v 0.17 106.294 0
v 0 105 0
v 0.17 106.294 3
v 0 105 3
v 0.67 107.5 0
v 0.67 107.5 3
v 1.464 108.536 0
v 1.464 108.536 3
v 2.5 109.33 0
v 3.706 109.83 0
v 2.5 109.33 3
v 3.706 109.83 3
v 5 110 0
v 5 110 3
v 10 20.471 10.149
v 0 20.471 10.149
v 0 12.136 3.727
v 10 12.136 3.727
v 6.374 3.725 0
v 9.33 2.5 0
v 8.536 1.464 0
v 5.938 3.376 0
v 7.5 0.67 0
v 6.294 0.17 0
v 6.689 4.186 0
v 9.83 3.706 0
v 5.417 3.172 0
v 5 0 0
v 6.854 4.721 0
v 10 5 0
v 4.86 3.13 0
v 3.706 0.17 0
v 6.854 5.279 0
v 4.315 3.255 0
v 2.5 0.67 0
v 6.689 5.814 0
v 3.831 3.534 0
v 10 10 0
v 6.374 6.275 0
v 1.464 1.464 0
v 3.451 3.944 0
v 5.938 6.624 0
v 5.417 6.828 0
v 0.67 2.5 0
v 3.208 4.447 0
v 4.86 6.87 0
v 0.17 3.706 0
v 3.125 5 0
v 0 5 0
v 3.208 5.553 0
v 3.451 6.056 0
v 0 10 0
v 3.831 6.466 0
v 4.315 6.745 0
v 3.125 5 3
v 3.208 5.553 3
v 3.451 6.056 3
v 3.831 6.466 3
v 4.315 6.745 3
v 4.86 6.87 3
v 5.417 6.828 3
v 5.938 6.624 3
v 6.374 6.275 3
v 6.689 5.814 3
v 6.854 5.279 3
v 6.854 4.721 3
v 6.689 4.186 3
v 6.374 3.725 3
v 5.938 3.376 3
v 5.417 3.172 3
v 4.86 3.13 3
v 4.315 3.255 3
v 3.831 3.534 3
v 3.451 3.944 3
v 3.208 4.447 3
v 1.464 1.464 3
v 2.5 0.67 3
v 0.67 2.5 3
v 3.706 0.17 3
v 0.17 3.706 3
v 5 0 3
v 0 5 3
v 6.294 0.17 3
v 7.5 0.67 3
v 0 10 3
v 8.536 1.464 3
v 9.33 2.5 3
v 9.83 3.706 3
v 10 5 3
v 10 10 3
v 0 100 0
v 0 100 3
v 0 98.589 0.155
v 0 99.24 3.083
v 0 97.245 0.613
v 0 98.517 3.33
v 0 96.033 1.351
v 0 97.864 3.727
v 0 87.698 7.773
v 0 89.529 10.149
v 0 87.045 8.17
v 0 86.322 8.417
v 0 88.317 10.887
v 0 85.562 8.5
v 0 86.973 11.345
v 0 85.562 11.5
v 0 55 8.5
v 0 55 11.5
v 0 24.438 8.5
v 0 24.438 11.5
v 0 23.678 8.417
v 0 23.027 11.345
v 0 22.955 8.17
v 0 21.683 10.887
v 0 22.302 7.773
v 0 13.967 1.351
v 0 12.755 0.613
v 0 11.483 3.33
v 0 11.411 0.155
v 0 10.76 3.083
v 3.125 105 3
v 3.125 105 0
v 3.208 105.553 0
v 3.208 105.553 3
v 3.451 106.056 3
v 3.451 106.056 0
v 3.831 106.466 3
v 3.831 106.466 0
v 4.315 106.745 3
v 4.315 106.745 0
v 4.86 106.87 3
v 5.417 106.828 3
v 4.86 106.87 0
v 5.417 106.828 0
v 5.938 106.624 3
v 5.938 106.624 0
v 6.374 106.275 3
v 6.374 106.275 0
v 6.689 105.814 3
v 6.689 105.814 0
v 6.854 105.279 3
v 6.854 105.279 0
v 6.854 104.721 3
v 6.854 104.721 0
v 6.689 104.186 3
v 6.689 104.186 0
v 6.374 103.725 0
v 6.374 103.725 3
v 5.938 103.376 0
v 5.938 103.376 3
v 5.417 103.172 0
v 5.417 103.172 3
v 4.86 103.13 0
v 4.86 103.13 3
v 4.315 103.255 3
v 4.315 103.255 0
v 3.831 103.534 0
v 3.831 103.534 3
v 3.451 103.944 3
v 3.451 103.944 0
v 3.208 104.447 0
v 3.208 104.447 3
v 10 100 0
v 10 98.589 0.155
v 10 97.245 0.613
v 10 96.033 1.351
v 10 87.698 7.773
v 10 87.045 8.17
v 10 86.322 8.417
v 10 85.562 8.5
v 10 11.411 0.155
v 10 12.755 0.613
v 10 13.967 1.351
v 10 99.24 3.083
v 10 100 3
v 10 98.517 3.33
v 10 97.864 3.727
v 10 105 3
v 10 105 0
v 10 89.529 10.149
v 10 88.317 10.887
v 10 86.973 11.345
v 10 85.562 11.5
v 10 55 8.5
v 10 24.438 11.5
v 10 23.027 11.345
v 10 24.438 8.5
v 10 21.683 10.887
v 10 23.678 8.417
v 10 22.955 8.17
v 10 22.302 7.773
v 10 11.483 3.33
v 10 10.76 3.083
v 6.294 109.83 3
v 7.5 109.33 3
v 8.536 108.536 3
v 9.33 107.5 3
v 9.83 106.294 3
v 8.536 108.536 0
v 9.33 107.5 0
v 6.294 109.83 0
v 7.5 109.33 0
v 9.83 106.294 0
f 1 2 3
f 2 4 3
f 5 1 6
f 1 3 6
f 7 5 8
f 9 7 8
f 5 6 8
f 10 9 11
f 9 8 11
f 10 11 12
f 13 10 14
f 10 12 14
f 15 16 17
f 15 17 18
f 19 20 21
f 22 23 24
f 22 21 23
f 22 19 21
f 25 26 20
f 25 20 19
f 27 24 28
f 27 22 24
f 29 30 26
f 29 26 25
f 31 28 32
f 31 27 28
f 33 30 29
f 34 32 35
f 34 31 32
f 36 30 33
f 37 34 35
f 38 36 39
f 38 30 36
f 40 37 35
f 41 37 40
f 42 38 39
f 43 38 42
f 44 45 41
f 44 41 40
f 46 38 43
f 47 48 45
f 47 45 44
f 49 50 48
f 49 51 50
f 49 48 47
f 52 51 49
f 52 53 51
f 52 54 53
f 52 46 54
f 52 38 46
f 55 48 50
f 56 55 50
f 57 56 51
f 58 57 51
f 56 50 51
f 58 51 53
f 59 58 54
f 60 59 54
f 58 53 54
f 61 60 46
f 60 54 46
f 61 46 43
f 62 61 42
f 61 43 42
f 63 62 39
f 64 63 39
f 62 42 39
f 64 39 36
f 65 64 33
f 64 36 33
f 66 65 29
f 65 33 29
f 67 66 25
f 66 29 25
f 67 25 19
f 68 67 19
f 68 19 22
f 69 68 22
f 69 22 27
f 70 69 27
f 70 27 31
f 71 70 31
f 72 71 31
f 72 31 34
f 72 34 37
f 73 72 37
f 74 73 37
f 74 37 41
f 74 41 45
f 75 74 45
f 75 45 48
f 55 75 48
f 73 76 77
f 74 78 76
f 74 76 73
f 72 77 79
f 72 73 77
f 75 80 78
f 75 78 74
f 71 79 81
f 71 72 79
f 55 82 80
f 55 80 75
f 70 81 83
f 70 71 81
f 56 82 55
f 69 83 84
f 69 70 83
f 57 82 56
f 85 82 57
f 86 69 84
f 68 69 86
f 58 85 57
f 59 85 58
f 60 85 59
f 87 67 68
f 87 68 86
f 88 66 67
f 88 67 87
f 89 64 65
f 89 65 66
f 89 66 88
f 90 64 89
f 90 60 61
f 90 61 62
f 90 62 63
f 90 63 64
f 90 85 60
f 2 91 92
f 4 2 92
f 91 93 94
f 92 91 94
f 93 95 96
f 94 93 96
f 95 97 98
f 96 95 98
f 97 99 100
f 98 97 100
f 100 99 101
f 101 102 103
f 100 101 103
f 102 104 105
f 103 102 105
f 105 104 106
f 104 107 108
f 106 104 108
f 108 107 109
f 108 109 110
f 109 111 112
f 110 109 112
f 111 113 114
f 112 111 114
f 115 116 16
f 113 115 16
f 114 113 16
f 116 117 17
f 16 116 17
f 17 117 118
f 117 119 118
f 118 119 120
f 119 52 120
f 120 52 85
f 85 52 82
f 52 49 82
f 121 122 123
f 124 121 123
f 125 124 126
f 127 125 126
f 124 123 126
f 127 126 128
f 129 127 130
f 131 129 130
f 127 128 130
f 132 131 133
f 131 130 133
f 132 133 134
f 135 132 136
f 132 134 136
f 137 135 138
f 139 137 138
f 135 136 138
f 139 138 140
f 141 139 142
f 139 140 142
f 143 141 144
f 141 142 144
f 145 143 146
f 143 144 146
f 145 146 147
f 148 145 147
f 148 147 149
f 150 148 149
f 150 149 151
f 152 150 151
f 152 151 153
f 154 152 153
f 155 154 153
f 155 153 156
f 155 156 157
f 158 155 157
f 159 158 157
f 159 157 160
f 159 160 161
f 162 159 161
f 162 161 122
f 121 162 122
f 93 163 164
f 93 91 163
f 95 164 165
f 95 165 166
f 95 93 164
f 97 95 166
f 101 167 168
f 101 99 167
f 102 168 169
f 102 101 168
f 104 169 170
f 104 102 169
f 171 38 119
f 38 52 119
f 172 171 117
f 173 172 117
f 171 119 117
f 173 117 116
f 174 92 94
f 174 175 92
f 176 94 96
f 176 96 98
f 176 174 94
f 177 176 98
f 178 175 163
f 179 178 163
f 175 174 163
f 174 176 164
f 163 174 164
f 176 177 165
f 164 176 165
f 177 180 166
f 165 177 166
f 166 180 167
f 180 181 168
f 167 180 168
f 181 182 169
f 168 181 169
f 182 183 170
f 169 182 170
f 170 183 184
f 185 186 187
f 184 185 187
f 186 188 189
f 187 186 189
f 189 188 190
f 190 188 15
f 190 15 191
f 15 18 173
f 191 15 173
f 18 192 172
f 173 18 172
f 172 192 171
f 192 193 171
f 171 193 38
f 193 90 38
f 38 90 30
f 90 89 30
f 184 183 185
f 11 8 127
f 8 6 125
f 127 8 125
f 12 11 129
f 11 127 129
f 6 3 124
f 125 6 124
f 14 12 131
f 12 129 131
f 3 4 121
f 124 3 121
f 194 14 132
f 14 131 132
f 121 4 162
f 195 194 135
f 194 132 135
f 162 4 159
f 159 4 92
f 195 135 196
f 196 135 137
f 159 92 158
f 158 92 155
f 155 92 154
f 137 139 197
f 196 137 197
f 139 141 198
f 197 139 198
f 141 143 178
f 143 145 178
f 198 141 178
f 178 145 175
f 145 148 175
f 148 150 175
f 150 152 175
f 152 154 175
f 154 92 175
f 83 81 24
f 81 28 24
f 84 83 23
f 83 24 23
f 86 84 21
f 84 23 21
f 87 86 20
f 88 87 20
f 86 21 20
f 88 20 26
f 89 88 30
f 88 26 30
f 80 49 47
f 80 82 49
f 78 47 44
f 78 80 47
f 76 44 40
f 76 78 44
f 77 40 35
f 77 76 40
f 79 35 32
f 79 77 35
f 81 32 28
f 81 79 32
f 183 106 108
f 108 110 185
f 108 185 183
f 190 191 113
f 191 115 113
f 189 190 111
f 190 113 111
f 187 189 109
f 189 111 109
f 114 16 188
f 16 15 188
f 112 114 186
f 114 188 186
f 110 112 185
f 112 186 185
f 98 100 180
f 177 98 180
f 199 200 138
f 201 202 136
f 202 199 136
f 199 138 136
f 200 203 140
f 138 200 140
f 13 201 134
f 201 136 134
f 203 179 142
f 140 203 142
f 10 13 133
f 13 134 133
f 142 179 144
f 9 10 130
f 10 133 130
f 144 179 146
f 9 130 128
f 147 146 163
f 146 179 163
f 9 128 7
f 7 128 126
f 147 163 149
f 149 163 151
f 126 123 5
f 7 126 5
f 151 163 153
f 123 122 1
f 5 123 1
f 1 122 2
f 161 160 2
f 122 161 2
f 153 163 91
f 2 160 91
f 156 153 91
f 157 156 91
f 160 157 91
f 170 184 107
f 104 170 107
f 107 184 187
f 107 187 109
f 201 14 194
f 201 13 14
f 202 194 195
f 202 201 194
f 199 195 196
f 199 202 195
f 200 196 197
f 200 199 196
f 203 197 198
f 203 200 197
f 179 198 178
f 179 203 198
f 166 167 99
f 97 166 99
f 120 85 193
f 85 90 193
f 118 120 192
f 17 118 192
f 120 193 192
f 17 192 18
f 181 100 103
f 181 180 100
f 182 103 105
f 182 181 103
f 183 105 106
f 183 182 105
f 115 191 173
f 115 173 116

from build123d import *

# Parameters (mm, degrees)
SKETCH6_W          = 10
SKETCH6_H          = 3
SKETCH8_R          = 1.875
CUT_EXTRUDE2_DEPTH = 112.050664113
FILLET1_R          = 5


with BuildPart() as part:
    # Sweep1: sweep along a path in Sketch7
    with BuildLine(Plane(origin=(0, 0, 0), x_dir=(0, 0, -1), z_dir=(1, 0, 0))) as sweep1_path:
        Line((-1.5, 0), (-1.5, 10))
        ThreePointArc((-1.5, 10), (-1.766933397, 11.611856238), (-2.539232213, 13.051609172))
        Line((-2.539232213, 13.051609172), (-8.960767787, 21.386297467))
        ThreePointArc((-8.960767787, 21.386297467), (-9.733066603, 22.8260504), (-10, 24.437906639))
        Line((-10, 24.437906639), (-10, 55))
    # Sketch6 → Sweep1 (sweep)
    with BuildSketch(Plane(origin=(0, 0, 0), x_dir=(1, 0, 0), z_dir=(0, 1, 0))):
        with Locations((5, -1.5)):
            Rectangle(SKETCH6_W, SKETCH6_H)
    sweep(path=sweep1_path.line)

    # Mirror2: part across plane


with BuildPart() as part_1:
    add(part.part)
    add(part.part.mirror(Plane(origin=(0, 55, 8.5), x_dir=(0, 0, 1), z_dir=(0, 1, 0))))

    # Sketch8 → Cut-Extrude2 (cut, through all)
    with BuildSketch(Plane(origin=(0, 0, 0), x_dir=(-1, 0, 0), z_dir=(0, 0, -1))):
        with Locations((-5, 5)):
            Circle(SKETCH8_R)
        with Locations((-5, 105)):
            Circle(SKETCH8_R)
    extrude(amount=-CUT_EXTRUDE2_DEPTH, mode=Mode.SUBTRACT)

    # Fillet1
    fillet1_edges = [part_1.edges().sort_by_distance(p)[0] for p in [
        (0, 0, 1.5),
        (10, 0, 1.5),
        (10, 110, 1.5),
        (0, 110, 1.5),
    ]]
    fillet(fillet1_edges, radius=FILLET1_R - 0.0001)  # a hair under: the kernel refuses the full size


solid = part_1.part
